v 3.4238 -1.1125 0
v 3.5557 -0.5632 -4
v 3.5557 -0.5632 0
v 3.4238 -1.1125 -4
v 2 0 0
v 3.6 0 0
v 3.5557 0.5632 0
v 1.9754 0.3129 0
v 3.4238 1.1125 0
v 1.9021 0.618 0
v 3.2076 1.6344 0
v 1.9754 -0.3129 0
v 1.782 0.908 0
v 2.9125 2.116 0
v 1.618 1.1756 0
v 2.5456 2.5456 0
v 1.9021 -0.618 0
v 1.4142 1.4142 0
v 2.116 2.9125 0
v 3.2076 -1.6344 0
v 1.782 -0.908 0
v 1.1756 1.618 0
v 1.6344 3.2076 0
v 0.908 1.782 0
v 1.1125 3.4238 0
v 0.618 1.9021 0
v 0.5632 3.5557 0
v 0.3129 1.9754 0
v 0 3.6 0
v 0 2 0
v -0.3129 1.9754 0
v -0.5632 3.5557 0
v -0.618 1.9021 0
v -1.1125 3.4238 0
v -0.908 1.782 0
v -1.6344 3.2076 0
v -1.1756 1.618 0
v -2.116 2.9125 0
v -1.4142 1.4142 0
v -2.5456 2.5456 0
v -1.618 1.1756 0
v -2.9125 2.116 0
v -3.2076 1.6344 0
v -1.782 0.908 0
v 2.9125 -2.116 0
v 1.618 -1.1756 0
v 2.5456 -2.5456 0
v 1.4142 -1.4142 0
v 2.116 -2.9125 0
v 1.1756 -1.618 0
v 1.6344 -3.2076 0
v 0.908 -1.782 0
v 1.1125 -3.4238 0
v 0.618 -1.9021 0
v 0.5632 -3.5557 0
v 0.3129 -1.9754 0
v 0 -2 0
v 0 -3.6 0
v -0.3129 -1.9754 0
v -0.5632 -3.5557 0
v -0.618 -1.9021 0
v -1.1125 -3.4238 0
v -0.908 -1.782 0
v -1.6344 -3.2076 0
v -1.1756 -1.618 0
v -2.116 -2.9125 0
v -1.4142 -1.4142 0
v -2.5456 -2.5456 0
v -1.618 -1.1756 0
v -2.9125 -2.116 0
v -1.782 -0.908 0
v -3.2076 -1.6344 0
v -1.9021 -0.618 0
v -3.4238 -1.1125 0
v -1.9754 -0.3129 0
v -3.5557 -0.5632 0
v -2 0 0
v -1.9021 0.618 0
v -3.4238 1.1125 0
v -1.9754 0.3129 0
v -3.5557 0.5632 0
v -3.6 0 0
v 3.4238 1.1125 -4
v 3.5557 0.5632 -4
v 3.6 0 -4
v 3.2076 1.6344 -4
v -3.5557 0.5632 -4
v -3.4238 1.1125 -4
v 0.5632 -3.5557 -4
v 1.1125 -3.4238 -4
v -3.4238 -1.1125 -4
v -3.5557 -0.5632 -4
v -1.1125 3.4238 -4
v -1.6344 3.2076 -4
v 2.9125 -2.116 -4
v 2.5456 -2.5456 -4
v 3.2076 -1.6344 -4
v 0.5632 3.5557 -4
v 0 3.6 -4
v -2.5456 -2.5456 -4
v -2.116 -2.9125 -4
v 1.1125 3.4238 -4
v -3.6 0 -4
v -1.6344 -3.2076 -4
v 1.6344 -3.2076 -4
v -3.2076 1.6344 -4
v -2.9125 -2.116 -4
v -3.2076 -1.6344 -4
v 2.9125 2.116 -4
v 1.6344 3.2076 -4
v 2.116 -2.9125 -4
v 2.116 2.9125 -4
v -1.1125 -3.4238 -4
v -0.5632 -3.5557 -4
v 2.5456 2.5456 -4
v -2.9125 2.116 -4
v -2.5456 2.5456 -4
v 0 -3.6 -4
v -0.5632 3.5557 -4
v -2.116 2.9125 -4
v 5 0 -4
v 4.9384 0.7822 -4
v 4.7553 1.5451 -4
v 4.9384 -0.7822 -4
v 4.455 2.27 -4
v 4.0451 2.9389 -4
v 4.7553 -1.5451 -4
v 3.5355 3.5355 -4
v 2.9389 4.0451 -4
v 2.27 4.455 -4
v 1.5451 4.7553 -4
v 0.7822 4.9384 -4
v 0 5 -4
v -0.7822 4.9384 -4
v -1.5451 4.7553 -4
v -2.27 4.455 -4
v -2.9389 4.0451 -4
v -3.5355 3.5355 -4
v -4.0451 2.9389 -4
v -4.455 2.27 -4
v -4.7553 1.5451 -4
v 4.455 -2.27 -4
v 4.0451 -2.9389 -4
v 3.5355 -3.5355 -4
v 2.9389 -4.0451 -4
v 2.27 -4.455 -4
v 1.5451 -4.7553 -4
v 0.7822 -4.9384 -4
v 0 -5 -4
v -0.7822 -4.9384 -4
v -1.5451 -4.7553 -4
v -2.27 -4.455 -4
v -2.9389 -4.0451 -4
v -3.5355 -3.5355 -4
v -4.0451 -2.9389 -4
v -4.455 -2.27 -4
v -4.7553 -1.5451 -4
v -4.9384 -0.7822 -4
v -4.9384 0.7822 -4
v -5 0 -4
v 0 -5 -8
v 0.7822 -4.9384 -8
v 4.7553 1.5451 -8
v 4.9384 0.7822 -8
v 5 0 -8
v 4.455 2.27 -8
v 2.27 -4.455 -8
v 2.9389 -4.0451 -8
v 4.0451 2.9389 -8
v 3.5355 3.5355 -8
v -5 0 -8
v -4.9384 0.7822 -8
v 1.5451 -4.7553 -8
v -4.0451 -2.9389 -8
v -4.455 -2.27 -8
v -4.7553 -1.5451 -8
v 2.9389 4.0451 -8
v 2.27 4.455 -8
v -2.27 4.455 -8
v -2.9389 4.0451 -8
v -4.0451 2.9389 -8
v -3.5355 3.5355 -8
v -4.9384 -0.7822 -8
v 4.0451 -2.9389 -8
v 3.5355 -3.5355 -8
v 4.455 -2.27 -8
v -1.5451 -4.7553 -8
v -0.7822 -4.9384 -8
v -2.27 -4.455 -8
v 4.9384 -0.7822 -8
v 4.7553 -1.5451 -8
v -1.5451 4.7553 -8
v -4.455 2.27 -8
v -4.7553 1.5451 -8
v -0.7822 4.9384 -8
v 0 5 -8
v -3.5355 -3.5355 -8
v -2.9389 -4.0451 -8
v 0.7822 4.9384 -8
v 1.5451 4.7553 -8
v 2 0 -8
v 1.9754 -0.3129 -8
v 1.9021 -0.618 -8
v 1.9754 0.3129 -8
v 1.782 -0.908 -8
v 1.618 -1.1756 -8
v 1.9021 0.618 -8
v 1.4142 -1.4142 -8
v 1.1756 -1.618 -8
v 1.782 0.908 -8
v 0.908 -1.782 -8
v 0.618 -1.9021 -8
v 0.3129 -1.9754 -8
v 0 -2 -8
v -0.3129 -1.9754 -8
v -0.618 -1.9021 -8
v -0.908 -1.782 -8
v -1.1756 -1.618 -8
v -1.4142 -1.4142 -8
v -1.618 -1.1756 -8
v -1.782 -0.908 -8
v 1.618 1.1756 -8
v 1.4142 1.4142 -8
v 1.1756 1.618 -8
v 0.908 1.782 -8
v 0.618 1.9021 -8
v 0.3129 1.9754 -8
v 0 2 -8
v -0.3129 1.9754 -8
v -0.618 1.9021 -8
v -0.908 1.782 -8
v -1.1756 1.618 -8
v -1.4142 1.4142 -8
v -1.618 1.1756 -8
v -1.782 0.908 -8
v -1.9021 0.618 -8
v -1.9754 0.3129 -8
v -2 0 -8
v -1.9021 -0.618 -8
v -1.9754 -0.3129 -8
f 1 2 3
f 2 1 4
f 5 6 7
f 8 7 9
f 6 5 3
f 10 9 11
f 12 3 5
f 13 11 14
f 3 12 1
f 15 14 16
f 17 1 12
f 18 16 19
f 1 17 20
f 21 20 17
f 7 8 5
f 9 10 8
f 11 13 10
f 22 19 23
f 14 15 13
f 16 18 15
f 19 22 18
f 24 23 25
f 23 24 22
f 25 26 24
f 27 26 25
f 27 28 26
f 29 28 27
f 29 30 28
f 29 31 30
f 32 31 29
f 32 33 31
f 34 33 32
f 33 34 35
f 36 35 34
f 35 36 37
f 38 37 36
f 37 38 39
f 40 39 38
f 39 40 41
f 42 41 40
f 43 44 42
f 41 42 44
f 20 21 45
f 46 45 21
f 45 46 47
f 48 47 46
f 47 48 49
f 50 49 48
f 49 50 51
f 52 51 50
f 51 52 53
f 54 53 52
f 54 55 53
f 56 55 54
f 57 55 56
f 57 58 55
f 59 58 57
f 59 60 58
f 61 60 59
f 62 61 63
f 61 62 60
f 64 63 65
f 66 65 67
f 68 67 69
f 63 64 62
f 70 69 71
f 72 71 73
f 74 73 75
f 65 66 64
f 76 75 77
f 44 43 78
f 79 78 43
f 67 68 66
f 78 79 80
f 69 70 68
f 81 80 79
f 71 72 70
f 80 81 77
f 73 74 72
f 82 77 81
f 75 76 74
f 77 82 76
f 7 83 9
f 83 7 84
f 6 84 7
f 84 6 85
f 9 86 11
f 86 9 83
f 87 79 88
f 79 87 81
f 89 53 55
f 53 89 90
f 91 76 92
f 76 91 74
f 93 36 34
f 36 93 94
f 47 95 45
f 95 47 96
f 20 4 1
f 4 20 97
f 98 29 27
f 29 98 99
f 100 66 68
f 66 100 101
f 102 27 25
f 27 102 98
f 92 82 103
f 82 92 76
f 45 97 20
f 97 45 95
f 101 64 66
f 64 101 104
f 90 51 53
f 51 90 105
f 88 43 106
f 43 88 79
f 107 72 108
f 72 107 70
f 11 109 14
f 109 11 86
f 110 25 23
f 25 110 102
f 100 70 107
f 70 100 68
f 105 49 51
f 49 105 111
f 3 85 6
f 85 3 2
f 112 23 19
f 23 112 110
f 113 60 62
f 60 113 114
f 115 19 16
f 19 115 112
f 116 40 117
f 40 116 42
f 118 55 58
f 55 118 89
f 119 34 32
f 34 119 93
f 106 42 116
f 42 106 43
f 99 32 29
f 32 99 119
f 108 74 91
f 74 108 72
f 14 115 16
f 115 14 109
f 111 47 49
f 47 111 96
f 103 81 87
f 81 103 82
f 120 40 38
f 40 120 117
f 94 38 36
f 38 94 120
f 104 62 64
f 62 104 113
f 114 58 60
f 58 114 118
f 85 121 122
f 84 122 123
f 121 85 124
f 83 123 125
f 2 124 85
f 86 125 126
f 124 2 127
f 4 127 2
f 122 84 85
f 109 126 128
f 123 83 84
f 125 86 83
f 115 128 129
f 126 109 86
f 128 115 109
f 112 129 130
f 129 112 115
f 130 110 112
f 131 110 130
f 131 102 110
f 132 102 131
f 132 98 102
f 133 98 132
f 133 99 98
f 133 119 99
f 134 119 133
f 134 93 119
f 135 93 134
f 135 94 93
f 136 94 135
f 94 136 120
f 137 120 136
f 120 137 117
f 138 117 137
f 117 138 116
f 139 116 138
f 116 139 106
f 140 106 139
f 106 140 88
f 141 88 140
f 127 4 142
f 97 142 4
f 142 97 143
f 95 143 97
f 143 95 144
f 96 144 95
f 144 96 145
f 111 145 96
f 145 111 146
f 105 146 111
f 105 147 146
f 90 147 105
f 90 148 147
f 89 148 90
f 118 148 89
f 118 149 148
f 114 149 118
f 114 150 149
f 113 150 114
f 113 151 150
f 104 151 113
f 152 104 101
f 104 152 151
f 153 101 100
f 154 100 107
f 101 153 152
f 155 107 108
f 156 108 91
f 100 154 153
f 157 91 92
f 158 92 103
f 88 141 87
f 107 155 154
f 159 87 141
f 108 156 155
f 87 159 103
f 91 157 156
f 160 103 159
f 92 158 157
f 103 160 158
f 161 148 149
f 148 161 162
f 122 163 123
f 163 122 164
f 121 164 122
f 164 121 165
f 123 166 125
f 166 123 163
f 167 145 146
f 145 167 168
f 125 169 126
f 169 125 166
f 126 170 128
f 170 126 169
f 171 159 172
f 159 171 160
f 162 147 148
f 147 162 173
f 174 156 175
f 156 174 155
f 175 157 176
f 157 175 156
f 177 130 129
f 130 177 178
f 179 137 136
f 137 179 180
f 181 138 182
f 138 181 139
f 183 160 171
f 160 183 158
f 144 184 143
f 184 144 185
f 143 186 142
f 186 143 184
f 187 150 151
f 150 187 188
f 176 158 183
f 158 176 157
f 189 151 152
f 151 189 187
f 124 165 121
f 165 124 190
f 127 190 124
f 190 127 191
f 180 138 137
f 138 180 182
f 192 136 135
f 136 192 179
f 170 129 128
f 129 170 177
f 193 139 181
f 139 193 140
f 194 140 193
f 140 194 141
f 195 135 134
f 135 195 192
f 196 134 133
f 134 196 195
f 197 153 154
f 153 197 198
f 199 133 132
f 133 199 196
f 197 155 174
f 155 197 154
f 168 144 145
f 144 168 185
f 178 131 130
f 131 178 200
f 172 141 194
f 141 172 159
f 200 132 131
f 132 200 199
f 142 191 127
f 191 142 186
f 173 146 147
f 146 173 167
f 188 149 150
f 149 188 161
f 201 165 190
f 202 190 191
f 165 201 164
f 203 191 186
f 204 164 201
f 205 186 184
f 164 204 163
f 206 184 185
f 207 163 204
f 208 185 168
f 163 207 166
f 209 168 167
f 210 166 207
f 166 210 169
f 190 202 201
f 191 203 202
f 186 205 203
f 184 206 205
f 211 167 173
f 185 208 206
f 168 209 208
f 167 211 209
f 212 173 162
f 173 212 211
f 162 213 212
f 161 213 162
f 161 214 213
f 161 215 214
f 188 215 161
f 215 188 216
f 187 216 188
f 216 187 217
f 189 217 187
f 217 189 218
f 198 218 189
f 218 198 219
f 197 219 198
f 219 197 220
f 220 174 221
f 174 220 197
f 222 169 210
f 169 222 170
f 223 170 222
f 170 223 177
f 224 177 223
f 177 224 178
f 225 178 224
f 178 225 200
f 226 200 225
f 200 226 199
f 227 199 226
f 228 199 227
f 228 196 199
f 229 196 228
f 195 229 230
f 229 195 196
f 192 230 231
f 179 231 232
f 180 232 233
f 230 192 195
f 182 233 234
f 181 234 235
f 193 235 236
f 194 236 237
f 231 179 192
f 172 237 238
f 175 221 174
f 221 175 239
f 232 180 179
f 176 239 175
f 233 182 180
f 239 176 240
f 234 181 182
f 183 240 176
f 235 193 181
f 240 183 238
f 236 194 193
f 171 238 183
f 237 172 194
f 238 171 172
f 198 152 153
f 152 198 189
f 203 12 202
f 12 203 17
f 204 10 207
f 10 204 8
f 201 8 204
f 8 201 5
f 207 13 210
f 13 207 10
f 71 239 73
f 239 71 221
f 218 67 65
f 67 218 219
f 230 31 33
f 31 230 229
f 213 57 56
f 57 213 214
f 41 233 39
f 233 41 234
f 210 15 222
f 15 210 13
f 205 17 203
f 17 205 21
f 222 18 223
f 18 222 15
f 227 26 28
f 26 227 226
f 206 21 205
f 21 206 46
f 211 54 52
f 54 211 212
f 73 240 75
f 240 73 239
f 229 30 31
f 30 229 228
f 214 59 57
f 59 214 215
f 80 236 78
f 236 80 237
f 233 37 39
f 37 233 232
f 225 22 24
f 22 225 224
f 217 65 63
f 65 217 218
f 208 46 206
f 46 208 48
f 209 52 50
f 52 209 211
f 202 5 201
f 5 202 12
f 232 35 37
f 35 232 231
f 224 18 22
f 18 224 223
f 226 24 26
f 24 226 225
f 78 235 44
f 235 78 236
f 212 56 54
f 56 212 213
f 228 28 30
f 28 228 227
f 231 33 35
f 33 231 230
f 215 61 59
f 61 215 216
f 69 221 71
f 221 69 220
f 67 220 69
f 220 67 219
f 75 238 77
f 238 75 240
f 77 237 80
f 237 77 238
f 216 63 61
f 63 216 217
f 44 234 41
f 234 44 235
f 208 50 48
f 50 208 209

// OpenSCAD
// file: dim.scad
M_0 = 0;
M_FORE = 91.4;
M_T = M_FORE;
DZ_FORE = 104.0;
DZ_FORE_OUTER = 4.0 * 25.4;
M_FORE_END = M_T + DZ_FORE;

D_INNER_AFT = 31.5;
D_OUTER_AFT = 41.7;
D_INNER_FORE = 29.0;

DZ_BUTTRESS = 4.0;
DZ_THREAD = 10.0;

DZ_INSET = 42.0;    // could be 40
DX_INSET = 18.0;

BOLT_TO_PORT = 12.0;  // has to be forward to clear the microcontroller
BOLT_TO_SWITCH = -12.0;

D_BUTTON_HEAD = 9.0;    // fixme
// main file
include <dim.scad>

EPS = 0.01;
$fn = 40;


BUTTON_WELL = 4.0;      // adjusted, depending. was: 3.5, 4.5
BUTTON_HEAD_D = 7.2;
BUTTON_HEAD_H = 1.6;
BUTTON_THREAD_H = 4.0;
BUTTON_THREAD_D = 4.0;
BUTTON_UNDER_WELL = 4.0;
BUTTON_UNDER_WELL_D = 10.0;

TACTILE_POST_H = 5.5;
TACTILE_POST_D = 3.4;
TACTILE_BASE_H = 3.8;
TACTILE_BASE_X = 6.0;

// Aligned to top
module cap() {
    color("gold") {
        translate([0, 0, -BUTTON_HEAD_H])
            cylinder(h=BUTTON_HEAD_H, d=BUTTON_HEAD_D);
        translate([0, 0, -BUTTON_HEAD_H - BUTTON_THREAD_H])
            cylinder(h=BUTTON_THREAD_H+EPS, d=BUTTON_THREAD_D- 0.1);
    }    
}

intersection() {
    translate([-100, -100, -100]) cube(size=[200, 200, 200]);
    union() {
        difference() {
            union() {
                translate([0, 0, -BUTTON_WELL])
                    cylinder(h=BUTTON_WELL, d=BUTTON_HEAD_D);
                translate([0, 0, -BUTTON_WELL - BUTTON_UNDER_WELL])
                    cylinder(h=BUTTON_UNDER_WELL, d=BUTTON_UNDER_WELL_D);
            }
            translate([0, 0, -100]) {
                cylinder(h=100 - BUTTON_THREAD_H, d=TACTILE_POST_D);
                cylinder(h=200, d=BUTTON_THREAD_D);
            }
            *translate([BUTTON_HEAD_D/2, -50, -100])
                cube(size=[100, 100, 100]);
        }
        *translate([0, 0, BUTTON_HEAD_H]) cap();
    }
}
